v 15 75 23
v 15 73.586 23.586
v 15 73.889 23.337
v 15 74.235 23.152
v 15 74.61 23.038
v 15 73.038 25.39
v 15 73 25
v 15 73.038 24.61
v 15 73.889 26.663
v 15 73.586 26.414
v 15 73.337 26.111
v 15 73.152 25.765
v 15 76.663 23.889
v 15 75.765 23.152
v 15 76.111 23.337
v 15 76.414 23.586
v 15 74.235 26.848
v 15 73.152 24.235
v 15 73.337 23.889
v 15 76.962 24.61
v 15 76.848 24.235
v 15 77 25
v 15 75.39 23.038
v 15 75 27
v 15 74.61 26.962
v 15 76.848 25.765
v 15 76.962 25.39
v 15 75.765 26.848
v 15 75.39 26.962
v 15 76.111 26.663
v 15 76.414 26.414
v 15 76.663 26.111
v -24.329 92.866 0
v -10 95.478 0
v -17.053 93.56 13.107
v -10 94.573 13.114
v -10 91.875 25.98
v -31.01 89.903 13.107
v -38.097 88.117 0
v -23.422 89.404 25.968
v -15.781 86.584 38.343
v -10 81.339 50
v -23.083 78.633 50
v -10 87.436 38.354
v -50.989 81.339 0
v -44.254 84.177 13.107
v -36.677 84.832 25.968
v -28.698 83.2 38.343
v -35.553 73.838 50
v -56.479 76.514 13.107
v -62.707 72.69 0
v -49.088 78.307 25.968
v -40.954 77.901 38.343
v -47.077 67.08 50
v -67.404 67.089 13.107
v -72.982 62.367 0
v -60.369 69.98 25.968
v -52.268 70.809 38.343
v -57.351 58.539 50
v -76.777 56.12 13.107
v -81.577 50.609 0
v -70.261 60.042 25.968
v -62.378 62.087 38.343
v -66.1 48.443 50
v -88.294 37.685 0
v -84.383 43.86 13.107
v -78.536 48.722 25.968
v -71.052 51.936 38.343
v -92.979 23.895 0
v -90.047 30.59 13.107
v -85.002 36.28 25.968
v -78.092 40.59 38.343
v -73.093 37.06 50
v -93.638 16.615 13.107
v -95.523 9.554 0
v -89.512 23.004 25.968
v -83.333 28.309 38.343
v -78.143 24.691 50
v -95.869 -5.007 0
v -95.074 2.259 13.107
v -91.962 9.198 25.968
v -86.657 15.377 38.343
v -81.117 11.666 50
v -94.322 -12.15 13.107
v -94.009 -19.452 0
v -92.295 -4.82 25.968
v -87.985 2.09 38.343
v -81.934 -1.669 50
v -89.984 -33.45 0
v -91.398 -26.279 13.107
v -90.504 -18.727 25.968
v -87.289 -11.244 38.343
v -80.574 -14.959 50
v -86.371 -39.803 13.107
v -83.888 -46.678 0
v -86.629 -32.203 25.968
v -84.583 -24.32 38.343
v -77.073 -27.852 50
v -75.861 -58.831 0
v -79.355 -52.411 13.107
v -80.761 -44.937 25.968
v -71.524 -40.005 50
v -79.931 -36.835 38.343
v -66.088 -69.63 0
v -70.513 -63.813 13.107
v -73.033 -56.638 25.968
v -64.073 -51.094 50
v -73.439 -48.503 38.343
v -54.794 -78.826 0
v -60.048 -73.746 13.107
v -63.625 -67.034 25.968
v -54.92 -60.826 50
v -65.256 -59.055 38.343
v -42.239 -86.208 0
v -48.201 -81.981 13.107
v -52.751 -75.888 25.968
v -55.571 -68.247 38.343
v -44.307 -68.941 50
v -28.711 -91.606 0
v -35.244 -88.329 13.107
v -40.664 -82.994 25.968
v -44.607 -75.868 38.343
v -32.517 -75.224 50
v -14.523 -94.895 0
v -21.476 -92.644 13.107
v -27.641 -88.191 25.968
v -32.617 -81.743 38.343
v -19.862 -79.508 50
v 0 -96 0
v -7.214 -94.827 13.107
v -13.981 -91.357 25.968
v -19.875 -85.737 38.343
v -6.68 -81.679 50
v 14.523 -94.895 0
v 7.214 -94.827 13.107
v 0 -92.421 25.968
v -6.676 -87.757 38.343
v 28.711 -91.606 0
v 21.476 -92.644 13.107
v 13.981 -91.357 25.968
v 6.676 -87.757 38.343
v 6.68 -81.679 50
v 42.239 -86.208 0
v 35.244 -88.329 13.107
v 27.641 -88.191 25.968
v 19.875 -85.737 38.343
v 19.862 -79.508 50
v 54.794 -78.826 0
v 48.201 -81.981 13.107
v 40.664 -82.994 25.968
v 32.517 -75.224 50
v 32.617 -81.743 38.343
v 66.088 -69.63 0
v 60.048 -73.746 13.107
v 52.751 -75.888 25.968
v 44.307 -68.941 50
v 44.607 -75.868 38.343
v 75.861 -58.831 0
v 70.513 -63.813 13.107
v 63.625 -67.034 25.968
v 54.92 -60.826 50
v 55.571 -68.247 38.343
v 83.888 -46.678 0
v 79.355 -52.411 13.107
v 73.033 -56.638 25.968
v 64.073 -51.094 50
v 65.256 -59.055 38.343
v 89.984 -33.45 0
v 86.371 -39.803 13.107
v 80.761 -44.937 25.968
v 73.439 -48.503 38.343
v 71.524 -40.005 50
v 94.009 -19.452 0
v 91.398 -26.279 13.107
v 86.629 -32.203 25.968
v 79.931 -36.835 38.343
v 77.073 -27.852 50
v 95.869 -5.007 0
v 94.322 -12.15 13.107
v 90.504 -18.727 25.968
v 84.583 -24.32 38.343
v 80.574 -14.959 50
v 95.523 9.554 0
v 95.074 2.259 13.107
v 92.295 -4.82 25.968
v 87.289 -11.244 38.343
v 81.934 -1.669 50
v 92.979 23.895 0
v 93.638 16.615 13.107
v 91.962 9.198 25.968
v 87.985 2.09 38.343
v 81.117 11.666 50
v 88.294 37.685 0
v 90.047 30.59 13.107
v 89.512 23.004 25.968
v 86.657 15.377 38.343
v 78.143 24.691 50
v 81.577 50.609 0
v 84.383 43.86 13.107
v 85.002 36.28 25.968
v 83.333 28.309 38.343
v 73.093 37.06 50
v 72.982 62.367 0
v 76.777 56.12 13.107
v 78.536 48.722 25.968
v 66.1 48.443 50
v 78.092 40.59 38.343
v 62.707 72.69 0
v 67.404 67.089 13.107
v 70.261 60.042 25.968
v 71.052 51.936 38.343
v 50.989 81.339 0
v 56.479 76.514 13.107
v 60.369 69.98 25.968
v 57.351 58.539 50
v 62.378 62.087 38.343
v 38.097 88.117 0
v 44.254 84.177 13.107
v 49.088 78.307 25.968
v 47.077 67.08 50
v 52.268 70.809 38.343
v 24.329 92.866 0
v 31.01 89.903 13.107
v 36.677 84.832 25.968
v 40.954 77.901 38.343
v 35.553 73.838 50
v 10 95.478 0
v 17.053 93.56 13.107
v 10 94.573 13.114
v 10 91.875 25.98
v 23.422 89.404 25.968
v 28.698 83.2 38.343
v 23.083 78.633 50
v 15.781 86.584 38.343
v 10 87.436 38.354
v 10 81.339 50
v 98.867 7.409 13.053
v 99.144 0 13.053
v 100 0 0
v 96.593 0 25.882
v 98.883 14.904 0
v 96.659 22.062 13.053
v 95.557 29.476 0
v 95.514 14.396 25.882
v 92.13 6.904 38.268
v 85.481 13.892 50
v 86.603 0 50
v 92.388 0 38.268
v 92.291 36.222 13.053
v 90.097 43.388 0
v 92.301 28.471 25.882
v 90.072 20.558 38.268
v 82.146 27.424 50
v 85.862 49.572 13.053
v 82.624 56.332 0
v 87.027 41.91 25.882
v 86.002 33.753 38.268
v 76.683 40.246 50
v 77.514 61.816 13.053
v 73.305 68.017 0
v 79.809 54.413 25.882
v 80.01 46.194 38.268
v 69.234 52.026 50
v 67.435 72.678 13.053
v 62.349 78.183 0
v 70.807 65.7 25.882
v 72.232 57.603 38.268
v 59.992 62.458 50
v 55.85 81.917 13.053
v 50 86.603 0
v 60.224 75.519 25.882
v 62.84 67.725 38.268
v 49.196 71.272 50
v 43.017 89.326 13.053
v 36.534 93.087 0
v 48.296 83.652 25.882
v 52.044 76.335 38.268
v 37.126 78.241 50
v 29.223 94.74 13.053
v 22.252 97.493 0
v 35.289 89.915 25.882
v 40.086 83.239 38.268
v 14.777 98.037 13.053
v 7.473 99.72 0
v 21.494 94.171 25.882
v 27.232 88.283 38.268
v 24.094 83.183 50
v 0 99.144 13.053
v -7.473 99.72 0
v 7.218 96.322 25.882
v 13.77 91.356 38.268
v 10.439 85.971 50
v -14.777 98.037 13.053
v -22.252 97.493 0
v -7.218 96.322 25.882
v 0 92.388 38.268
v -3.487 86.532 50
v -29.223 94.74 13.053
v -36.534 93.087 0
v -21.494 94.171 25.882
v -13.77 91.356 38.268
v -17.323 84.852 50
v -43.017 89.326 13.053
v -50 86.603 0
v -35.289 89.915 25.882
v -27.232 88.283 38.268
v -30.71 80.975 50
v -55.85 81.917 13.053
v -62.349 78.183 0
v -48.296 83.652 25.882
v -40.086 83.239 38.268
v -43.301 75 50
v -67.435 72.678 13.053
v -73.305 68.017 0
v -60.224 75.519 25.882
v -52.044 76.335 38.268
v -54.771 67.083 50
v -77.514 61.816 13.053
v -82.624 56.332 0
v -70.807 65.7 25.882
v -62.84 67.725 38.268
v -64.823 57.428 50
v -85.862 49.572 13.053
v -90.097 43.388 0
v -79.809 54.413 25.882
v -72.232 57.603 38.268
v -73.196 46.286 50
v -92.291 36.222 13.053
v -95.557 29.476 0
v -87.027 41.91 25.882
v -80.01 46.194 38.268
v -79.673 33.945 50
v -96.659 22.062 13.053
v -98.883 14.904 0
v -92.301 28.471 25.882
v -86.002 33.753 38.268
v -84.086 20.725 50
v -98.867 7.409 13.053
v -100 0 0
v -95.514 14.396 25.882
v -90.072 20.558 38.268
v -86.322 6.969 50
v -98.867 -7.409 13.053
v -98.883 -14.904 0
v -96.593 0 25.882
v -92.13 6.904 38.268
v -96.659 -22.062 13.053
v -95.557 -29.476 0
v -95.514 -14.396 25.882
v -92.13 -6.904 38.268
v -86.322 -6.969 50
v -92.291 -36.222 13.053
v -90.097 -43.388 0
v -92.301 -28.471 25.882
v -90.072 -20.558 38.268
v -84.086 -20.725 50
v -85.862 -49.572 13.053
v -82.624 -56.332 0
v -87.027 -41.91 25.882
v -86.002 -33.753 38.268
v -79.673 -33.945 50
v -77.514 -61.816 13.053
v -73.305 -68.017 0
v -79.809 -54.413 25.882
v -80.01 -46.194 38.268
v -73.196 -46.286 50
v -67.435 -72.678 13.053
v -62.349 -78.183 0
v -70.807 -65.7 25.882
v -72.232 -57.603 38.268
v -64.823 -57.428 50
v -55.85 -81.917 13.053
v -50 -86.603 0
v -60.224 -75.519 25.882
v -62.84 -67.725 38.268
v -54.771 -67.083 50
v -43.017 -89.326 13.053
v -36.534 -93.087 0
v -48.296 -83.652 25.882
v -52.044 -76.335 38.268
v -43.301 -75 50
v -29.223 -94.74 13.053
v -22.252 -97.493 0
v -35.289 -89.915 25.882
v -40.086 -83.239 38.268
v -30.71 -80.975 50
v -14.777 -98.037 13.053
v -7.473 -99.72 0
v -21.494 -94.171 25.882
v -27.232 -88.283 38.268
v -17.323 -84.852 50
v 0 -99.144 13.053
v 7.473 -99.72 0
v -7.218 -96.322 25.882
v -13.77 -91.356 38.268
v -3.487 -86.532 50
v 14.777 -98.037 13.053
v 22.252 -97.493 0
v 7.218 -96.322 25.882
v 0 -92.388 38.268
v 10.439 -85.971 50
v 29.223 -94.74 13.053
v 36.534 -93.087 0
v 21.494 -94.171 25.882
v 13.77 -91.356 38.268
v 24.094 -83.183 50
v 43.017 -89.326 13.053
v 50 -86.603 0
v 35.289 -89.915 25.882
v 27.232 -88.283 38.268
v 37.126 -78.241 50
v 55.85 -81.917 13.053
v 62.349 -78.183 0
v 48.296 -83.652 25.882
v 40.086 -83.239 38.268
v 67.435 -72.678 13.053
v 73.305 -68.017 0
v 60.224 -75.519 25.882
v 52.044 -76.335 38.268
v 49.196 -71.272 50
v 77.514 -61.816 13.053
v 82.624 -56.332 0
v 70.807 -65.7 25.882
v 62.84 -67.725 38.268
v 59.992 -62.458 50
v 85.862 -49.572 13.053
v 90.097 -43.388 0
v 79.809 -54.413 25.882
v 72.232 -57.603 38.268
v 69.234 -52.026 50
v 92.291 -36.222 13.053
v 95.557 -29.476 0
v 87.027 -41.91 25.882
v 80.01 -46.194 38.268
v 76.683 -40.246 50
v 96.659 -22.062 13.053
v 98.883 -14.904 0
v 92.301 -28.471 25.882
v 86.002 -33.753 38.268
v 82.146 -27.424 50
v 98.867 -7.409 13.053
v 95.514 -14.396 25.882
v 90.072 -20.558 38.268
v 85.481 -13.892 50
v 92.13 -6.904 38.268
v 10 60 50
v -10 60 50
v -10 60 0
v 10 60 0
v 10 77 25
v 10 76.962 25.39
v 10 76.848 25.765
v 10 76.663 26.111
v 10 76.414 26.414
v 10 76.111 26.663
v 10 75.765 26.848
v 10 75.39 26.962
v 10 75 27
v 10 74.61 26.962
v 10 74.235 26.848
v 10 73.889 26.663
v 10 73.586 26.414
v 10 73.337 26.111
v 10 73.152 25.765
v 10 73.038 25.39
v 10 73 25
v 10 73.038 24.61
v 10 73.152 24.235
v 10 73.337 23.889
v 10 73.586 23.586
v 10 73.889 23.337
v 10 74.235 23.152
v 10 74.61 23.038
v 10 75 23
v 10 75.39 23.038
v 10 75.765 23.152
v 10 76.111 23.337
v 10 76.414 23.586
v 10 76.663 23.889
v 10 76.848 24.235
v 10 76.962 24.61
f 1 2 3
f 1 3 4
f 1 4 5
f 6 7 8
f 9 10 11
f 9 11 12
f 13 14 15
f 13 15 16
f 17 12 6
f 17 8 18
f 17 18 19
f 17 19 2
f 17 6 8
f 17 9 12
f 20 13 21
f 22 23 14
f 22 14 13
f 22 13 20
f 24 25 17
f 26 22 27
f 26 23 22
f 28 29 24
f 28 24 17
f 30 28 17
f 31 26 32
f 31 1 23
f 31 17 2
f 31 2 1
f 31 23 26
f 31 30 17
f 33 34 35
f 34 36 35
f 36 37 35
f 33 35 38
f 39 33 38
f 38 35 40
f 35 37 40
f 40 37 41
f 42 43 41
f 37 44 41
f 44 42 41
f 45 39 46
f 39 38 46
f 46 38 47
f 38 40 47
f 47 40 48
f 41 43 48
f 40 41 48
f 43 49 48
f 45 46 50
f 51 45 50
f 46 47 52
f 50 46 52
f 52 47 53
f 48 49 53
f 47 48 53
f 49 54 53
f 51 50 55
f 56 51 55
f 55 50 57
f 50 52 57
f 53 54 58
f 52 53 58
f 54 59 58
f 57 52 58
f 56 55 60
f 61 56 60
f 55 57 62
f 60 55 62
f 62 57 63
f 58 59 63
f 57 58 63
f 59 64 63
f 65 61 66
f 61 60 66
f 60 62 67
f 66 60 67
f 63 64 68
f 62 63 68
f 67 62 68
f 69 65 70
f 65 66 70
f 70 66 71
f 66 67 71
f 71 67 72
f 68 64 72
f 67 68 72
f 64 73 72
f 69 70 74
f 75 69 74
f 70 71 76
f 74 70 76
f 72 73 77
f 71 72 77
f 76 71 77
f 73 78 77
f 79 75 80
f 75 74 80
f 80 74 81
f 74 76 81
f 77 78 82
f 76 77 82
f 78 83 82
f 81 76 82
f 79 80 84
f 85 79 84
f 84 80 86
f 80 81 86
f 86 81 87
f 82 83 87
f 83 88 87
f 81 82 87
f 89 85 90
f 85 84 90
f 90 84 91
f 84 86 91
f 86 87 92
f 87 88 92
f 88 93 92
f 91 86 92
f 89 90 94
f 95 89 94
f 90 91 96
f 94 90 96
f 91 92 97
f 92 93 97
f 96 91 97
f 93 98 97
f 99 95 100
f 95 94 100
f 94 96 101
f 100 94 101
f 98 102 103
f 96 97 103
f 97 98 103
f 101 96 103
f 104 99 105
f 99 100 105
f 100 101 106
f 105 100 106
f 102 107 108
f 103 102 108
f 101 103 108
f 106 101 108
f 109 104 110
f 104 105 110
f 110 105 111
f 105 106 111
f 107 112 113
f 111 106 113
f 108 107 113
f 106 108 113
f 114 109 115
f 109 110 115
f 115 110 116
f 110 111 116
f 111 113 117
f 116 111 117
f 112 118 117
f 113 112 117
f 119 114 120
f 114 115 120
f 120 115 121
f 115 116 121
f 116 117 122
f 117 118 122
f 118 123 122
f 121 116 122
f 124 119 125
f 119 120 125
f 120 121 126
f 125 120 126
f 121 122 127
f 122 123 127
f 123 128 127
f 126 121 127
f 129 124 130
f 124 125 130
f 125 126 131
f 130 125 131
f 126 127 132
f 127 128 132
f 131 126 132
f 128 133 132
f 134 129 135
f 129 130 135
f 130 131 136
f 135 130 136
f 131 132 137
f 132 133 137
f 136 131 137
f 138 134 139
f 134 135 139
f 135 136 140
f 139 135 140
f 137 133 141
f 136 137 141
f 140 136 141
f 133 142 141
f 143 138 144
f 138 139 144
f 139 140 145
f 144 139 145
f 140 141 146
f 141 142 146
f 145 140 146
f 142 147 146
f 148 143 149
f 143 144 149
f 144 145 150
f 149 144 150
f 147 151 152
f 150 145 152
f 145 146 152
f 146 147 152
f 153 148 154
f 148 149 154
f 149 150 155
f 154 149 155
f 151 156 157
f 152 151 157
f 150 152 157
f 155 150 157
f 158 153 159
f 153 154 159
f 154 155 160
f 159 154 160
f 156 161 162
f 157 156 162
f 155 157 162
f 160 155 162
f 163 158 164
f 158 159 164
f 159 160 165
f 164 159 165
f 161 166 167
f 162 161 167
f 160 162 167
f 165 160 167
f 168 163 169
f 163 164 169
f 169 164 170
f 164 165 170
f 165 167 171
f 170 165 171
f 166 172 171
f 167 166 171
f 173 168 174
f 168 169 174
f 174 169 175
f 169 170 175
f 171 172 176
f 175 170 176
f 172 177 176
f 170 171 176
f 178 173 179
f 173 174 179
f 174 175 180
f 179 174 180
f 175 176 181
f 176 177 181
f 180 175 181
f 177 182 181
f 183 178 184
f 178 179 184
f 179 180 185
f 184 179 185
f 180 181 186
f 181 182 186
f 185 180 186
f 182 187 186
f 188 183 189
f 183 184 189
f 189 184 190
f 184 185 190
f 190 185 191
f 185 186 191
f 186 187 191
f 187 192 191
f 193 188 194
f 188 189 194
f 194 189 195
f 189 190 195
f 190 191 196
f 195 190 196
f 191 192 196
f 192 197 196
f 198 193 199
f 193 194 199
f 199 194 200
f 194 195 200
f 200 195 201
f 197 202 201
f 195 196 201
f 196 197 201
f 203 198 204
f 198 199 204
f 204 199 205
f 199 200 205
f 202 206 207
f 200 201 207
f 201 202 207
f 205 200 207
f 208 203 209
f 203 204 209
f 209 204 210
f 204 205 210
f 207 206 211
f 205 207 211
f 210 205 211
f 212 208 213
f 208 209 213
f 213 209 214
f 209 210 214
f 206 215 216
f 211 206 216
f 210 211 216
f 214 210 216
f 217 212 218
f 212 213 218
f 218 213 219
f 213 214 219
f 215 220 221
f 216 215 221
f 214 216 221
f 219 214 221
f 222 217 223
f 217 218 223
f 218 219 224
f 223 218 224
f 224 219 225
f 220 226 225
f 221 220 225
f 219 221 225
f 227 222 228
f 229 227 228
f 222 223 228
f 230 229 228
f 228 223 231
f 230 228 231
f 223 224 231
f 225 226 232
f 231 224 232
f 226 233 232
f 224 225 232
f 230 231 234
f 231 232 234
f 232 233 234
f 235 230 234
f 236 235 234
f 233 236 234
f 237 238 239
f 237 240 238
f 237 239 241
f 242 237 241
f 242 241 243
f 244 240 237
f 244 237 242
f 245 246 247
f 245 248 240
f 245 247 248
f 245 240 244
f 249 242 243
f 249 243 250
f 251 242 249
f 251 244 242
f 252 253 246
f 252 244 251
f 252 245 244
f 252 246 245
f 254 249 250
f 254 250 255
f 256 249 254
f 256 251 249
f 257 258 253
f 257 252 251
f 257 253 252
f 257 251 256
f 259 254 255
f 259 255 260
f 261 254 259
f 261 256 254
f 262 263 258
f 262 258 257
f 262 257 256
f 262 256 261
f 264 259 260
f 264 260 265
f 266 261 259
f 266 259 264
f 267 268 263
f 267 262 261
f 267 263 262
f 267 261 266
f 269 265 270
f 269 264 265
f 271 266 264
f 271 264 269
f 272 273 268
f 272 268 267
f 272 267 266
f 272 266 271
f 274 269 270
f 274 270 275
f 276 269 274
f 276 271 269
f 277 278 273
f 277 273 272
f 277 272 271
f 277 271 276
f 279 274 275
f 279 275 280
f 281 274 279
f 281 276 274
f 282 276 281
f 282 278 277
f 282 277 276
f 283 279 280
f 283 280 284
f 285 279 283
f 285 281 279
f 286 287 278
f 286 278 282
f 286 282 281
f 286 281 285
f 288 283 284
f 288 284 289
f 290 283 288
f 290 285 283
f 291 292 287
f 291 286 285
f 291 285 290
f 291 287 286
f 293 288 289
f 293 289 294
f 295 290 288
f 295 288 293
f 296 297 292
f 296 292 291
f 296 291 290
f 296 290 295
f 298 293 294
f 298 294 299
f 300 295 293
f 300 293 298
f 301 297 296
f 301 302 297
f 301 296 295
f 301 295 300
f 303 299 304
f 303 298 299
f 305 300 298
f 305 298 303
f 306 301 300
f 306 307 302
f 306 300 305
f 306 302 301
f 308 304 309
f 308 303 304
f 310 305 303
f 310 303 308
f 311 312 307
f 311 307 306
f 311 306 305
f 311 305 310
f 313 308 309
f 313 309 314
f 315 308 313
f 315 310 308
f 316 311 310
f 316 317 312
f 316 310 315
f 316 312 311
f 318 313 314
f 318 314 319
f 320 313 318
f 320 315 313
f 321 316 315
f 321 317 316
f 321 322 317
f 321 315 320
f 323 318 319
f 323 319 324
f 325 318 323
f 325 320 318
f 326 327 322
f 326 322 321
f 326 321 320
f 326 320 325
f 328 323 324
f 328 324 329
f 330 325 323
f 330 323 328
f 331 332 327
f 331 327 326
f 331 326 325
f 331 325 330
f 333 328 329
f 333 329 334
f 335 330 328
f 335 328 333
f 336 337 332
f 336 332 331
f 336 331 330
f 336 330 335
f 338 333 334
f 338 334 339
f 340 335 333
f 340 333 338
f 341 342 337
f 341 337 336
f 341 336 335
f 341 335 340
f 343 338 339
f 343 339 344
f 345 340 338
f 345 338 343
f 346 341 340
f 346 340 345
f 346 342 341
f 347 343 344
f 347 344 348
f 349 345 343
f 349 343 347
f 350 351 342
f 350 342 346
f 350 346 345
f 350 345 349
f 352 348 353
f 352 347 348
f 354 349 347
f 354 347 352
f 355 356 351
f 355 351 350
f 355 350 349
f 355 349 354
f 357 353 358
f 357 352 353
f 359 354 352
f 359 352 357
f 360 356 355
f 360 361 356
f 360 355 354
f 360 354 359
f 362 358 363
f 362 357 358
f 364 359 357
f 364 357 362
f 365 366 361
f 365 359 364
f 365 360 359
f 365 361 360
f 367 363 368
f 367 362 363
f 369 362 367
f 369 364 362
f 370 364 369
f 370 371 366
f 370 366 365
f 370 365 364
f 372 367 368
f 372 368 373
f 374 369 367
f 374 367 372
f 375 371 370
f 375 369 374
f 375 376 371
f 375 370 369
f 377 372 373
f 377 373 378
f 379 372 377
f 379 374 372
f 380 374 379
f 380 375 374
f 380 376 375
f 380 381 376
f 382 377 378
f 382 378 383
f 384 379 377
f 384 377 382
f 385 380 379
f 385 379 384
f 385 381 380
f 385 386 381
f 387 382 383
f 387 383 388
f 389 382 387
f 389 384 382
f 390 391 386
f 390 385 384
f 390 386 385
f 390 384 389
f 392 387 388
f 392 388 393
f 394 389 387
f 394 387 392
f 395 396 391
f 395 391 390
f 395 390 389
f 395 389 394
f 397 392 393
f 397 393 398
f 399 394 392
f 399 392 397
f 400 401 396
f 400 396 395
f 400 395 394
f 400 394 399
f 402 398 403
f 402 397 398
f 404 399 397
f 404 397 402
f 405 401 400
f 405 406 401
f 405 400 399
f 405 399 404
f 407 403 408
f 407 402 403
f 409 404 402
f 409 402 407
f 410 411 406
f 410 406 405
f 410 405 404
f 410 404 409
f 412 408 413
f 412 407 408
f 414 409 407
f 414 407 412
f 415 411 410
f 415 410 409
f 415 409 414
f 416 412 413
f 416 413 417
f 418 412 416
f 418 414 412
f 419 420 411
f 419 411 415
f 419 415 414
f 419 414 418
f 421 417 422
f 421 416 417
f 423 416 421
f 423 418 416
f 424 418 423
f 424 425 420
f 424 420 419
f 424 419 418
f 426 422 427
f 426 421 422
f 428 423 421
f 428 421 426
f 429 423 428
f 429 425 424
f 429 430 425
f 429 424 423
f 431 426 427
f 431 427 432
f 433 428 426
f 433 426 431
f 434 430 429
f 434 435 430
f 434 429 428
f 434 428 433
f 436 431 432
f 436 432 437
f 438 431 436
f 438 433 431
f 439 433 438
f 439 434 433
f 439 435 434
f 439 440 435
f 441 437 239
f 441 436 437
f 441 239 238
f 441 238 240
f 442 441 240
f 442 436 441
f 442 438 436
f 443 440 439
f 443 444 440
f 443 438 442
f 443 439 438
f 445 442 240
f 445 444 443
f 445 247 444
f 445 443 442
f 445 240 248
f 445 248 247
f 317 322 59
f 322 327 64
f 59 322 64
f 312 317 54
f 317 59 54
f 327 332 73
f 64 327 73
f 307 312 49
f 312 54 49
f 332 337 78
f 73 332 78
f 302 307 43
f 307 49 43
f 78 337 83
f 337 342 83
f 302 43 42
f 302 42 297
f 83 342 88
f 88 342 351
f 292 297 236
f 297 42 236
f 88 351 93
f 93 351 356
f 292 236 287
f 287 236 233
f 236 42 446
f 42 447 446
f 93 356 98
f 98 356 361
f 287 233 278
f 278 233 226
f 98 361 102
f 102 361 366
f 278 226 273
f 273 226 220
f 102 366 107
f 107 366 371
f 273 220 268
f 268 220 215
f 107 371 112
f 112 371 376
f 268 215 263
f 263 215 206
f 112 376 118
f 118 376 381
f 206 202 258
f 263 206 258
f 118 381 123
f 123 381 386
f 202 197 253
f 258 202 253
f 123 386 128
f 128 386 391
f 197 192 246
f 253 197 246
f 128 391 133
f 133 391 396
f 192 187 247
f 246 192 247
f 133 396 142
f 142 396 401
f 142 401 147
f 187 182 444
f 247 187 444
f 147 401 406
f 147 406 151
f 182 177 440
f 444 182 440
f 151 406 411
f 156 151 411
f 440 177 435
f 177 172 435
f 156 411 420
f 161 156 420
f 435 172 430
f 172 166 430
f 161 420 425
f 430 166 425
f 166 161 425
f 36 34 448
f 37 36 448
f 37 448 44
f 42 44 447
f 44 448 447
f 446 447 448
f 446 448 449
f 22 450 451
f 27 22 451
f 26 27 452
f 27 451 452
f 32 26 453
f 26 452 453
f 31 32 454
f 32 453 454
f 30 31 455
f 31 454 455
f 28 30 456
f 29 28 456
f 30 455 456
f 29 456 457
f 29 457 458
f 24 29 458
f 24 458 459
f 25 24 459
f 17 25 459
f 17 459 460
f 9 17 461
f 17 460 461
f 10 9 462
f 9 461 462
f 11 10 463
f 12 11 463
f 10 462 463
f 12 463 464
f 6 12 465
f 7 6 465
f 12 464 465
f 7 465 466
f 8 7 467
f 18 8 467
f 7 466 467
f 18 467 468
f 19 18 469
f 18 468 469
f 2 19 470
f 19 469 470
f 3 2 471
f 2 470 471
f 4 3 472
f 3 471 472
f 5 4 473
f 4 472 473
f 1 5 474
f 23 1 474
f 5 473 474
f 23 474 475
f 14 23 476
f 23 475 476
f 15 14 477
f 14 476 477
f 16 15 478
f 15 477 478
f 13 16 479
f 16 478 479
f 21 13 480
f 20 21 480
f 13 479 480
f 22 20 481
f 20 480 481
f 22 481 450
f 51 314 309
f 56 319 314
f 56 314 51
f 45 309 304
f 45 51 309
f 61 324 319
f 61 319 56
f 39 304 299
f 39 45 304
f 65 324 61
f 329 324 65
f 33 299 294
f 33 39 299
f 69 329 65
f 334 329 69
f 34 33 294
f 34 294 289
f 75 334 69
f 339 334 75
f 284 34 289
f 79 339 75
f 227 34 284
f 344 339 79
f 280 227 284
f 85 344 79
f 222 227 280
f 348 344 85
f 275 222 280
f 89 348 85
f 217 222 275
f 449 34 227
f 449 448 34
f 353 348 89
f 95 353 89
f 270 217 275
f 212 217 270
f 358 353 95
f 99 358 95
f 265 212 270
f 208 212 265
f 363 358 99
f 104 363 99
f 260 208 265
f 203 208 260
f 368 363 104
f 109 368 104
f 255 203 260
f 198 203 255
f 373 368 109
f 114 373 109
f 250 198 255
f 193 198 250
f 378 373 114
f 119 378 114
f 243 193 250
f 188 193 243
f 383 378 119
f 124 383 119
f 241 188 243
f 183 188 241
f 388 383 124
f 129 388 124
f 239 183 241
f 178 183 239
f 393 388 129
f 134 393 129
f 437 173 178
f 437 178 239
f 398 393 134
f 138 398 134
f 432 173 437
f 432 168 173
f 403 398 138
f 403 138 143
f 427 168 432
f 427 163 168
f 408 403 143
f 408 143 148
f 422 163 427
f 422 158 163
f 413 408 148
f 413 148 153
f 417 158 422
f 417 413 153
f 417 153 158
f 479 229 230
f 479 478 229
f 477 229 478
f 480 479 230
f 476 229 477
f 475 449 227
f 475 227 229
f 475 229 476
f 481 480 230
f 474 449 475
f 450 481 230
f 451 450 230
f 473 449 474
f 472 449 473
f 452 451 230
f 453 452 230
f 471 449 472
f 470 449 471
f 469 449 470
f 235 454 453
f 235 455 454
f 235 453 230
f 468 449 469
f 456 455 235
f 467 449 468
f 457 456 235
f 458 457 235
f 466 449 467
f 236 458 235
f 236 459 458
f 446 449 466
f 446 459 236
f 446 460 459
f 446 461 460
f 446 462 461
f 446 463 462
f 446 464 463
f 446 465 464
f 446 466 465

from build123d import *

# Parameters (mm, degrees)
F2_T     = -4
F4_W     = 20
F4_H     = 50
F5_REACH = 93.8526480713
F6_R     = 2
F7_DEPTH = 5


with BuildPart() as f1:
    # F0 (on Front) → F1 (revolve)
    with BuildSketch(Plane.XZ):
        with BuildLine():
            Line((0, 0), (100, 0))
            ThreePointArc((100, 0), (96.5925826289, 25.8819045103), (86.6025403784, 50))
            Line((86.6025403784, 50), (0, 50))
            Line((0, 50), (0, 0))
        make_face()
    revolve(axis=Axis((0, 0, 53.0949570239), (0, 0, 1)))

    # F2
    f2_openings = [f1.faces().sort_by_distance(p)[0] for p in [
        (0, 0, 0),
        (0, 0, 50),
    ]]
    offset(amount=F2_T, openings=f2_openings)

    f5_end = f1.faces().sort_by_distance((-96.5925826289, 0, 25.8819045103))[0]
    # F4 (on offset) → F5 (join, up to a face of the model that its end follows)
    with BuildSketch(Plane.XZ.offset(-60)):
        with Locations((0, 25)):
            Rectangle(F4_W, F4_H)
    f5_long = extrude(amount=-F5_REACH, mode=Mode.PRIVATE)
    add(split(f5_long, bisect_by=f5_end, keep=Keep.BOTTOM, mode=Mode.PRIVATE))

    # F6 (on face) → F7 (join)
    with BuildSketch(Plane.YZ.offset(10)):
        with Locations((75, 25)):
            Circle(F6_R)
    extrude(amount=F7_DEPTH)


solid = f1.part
